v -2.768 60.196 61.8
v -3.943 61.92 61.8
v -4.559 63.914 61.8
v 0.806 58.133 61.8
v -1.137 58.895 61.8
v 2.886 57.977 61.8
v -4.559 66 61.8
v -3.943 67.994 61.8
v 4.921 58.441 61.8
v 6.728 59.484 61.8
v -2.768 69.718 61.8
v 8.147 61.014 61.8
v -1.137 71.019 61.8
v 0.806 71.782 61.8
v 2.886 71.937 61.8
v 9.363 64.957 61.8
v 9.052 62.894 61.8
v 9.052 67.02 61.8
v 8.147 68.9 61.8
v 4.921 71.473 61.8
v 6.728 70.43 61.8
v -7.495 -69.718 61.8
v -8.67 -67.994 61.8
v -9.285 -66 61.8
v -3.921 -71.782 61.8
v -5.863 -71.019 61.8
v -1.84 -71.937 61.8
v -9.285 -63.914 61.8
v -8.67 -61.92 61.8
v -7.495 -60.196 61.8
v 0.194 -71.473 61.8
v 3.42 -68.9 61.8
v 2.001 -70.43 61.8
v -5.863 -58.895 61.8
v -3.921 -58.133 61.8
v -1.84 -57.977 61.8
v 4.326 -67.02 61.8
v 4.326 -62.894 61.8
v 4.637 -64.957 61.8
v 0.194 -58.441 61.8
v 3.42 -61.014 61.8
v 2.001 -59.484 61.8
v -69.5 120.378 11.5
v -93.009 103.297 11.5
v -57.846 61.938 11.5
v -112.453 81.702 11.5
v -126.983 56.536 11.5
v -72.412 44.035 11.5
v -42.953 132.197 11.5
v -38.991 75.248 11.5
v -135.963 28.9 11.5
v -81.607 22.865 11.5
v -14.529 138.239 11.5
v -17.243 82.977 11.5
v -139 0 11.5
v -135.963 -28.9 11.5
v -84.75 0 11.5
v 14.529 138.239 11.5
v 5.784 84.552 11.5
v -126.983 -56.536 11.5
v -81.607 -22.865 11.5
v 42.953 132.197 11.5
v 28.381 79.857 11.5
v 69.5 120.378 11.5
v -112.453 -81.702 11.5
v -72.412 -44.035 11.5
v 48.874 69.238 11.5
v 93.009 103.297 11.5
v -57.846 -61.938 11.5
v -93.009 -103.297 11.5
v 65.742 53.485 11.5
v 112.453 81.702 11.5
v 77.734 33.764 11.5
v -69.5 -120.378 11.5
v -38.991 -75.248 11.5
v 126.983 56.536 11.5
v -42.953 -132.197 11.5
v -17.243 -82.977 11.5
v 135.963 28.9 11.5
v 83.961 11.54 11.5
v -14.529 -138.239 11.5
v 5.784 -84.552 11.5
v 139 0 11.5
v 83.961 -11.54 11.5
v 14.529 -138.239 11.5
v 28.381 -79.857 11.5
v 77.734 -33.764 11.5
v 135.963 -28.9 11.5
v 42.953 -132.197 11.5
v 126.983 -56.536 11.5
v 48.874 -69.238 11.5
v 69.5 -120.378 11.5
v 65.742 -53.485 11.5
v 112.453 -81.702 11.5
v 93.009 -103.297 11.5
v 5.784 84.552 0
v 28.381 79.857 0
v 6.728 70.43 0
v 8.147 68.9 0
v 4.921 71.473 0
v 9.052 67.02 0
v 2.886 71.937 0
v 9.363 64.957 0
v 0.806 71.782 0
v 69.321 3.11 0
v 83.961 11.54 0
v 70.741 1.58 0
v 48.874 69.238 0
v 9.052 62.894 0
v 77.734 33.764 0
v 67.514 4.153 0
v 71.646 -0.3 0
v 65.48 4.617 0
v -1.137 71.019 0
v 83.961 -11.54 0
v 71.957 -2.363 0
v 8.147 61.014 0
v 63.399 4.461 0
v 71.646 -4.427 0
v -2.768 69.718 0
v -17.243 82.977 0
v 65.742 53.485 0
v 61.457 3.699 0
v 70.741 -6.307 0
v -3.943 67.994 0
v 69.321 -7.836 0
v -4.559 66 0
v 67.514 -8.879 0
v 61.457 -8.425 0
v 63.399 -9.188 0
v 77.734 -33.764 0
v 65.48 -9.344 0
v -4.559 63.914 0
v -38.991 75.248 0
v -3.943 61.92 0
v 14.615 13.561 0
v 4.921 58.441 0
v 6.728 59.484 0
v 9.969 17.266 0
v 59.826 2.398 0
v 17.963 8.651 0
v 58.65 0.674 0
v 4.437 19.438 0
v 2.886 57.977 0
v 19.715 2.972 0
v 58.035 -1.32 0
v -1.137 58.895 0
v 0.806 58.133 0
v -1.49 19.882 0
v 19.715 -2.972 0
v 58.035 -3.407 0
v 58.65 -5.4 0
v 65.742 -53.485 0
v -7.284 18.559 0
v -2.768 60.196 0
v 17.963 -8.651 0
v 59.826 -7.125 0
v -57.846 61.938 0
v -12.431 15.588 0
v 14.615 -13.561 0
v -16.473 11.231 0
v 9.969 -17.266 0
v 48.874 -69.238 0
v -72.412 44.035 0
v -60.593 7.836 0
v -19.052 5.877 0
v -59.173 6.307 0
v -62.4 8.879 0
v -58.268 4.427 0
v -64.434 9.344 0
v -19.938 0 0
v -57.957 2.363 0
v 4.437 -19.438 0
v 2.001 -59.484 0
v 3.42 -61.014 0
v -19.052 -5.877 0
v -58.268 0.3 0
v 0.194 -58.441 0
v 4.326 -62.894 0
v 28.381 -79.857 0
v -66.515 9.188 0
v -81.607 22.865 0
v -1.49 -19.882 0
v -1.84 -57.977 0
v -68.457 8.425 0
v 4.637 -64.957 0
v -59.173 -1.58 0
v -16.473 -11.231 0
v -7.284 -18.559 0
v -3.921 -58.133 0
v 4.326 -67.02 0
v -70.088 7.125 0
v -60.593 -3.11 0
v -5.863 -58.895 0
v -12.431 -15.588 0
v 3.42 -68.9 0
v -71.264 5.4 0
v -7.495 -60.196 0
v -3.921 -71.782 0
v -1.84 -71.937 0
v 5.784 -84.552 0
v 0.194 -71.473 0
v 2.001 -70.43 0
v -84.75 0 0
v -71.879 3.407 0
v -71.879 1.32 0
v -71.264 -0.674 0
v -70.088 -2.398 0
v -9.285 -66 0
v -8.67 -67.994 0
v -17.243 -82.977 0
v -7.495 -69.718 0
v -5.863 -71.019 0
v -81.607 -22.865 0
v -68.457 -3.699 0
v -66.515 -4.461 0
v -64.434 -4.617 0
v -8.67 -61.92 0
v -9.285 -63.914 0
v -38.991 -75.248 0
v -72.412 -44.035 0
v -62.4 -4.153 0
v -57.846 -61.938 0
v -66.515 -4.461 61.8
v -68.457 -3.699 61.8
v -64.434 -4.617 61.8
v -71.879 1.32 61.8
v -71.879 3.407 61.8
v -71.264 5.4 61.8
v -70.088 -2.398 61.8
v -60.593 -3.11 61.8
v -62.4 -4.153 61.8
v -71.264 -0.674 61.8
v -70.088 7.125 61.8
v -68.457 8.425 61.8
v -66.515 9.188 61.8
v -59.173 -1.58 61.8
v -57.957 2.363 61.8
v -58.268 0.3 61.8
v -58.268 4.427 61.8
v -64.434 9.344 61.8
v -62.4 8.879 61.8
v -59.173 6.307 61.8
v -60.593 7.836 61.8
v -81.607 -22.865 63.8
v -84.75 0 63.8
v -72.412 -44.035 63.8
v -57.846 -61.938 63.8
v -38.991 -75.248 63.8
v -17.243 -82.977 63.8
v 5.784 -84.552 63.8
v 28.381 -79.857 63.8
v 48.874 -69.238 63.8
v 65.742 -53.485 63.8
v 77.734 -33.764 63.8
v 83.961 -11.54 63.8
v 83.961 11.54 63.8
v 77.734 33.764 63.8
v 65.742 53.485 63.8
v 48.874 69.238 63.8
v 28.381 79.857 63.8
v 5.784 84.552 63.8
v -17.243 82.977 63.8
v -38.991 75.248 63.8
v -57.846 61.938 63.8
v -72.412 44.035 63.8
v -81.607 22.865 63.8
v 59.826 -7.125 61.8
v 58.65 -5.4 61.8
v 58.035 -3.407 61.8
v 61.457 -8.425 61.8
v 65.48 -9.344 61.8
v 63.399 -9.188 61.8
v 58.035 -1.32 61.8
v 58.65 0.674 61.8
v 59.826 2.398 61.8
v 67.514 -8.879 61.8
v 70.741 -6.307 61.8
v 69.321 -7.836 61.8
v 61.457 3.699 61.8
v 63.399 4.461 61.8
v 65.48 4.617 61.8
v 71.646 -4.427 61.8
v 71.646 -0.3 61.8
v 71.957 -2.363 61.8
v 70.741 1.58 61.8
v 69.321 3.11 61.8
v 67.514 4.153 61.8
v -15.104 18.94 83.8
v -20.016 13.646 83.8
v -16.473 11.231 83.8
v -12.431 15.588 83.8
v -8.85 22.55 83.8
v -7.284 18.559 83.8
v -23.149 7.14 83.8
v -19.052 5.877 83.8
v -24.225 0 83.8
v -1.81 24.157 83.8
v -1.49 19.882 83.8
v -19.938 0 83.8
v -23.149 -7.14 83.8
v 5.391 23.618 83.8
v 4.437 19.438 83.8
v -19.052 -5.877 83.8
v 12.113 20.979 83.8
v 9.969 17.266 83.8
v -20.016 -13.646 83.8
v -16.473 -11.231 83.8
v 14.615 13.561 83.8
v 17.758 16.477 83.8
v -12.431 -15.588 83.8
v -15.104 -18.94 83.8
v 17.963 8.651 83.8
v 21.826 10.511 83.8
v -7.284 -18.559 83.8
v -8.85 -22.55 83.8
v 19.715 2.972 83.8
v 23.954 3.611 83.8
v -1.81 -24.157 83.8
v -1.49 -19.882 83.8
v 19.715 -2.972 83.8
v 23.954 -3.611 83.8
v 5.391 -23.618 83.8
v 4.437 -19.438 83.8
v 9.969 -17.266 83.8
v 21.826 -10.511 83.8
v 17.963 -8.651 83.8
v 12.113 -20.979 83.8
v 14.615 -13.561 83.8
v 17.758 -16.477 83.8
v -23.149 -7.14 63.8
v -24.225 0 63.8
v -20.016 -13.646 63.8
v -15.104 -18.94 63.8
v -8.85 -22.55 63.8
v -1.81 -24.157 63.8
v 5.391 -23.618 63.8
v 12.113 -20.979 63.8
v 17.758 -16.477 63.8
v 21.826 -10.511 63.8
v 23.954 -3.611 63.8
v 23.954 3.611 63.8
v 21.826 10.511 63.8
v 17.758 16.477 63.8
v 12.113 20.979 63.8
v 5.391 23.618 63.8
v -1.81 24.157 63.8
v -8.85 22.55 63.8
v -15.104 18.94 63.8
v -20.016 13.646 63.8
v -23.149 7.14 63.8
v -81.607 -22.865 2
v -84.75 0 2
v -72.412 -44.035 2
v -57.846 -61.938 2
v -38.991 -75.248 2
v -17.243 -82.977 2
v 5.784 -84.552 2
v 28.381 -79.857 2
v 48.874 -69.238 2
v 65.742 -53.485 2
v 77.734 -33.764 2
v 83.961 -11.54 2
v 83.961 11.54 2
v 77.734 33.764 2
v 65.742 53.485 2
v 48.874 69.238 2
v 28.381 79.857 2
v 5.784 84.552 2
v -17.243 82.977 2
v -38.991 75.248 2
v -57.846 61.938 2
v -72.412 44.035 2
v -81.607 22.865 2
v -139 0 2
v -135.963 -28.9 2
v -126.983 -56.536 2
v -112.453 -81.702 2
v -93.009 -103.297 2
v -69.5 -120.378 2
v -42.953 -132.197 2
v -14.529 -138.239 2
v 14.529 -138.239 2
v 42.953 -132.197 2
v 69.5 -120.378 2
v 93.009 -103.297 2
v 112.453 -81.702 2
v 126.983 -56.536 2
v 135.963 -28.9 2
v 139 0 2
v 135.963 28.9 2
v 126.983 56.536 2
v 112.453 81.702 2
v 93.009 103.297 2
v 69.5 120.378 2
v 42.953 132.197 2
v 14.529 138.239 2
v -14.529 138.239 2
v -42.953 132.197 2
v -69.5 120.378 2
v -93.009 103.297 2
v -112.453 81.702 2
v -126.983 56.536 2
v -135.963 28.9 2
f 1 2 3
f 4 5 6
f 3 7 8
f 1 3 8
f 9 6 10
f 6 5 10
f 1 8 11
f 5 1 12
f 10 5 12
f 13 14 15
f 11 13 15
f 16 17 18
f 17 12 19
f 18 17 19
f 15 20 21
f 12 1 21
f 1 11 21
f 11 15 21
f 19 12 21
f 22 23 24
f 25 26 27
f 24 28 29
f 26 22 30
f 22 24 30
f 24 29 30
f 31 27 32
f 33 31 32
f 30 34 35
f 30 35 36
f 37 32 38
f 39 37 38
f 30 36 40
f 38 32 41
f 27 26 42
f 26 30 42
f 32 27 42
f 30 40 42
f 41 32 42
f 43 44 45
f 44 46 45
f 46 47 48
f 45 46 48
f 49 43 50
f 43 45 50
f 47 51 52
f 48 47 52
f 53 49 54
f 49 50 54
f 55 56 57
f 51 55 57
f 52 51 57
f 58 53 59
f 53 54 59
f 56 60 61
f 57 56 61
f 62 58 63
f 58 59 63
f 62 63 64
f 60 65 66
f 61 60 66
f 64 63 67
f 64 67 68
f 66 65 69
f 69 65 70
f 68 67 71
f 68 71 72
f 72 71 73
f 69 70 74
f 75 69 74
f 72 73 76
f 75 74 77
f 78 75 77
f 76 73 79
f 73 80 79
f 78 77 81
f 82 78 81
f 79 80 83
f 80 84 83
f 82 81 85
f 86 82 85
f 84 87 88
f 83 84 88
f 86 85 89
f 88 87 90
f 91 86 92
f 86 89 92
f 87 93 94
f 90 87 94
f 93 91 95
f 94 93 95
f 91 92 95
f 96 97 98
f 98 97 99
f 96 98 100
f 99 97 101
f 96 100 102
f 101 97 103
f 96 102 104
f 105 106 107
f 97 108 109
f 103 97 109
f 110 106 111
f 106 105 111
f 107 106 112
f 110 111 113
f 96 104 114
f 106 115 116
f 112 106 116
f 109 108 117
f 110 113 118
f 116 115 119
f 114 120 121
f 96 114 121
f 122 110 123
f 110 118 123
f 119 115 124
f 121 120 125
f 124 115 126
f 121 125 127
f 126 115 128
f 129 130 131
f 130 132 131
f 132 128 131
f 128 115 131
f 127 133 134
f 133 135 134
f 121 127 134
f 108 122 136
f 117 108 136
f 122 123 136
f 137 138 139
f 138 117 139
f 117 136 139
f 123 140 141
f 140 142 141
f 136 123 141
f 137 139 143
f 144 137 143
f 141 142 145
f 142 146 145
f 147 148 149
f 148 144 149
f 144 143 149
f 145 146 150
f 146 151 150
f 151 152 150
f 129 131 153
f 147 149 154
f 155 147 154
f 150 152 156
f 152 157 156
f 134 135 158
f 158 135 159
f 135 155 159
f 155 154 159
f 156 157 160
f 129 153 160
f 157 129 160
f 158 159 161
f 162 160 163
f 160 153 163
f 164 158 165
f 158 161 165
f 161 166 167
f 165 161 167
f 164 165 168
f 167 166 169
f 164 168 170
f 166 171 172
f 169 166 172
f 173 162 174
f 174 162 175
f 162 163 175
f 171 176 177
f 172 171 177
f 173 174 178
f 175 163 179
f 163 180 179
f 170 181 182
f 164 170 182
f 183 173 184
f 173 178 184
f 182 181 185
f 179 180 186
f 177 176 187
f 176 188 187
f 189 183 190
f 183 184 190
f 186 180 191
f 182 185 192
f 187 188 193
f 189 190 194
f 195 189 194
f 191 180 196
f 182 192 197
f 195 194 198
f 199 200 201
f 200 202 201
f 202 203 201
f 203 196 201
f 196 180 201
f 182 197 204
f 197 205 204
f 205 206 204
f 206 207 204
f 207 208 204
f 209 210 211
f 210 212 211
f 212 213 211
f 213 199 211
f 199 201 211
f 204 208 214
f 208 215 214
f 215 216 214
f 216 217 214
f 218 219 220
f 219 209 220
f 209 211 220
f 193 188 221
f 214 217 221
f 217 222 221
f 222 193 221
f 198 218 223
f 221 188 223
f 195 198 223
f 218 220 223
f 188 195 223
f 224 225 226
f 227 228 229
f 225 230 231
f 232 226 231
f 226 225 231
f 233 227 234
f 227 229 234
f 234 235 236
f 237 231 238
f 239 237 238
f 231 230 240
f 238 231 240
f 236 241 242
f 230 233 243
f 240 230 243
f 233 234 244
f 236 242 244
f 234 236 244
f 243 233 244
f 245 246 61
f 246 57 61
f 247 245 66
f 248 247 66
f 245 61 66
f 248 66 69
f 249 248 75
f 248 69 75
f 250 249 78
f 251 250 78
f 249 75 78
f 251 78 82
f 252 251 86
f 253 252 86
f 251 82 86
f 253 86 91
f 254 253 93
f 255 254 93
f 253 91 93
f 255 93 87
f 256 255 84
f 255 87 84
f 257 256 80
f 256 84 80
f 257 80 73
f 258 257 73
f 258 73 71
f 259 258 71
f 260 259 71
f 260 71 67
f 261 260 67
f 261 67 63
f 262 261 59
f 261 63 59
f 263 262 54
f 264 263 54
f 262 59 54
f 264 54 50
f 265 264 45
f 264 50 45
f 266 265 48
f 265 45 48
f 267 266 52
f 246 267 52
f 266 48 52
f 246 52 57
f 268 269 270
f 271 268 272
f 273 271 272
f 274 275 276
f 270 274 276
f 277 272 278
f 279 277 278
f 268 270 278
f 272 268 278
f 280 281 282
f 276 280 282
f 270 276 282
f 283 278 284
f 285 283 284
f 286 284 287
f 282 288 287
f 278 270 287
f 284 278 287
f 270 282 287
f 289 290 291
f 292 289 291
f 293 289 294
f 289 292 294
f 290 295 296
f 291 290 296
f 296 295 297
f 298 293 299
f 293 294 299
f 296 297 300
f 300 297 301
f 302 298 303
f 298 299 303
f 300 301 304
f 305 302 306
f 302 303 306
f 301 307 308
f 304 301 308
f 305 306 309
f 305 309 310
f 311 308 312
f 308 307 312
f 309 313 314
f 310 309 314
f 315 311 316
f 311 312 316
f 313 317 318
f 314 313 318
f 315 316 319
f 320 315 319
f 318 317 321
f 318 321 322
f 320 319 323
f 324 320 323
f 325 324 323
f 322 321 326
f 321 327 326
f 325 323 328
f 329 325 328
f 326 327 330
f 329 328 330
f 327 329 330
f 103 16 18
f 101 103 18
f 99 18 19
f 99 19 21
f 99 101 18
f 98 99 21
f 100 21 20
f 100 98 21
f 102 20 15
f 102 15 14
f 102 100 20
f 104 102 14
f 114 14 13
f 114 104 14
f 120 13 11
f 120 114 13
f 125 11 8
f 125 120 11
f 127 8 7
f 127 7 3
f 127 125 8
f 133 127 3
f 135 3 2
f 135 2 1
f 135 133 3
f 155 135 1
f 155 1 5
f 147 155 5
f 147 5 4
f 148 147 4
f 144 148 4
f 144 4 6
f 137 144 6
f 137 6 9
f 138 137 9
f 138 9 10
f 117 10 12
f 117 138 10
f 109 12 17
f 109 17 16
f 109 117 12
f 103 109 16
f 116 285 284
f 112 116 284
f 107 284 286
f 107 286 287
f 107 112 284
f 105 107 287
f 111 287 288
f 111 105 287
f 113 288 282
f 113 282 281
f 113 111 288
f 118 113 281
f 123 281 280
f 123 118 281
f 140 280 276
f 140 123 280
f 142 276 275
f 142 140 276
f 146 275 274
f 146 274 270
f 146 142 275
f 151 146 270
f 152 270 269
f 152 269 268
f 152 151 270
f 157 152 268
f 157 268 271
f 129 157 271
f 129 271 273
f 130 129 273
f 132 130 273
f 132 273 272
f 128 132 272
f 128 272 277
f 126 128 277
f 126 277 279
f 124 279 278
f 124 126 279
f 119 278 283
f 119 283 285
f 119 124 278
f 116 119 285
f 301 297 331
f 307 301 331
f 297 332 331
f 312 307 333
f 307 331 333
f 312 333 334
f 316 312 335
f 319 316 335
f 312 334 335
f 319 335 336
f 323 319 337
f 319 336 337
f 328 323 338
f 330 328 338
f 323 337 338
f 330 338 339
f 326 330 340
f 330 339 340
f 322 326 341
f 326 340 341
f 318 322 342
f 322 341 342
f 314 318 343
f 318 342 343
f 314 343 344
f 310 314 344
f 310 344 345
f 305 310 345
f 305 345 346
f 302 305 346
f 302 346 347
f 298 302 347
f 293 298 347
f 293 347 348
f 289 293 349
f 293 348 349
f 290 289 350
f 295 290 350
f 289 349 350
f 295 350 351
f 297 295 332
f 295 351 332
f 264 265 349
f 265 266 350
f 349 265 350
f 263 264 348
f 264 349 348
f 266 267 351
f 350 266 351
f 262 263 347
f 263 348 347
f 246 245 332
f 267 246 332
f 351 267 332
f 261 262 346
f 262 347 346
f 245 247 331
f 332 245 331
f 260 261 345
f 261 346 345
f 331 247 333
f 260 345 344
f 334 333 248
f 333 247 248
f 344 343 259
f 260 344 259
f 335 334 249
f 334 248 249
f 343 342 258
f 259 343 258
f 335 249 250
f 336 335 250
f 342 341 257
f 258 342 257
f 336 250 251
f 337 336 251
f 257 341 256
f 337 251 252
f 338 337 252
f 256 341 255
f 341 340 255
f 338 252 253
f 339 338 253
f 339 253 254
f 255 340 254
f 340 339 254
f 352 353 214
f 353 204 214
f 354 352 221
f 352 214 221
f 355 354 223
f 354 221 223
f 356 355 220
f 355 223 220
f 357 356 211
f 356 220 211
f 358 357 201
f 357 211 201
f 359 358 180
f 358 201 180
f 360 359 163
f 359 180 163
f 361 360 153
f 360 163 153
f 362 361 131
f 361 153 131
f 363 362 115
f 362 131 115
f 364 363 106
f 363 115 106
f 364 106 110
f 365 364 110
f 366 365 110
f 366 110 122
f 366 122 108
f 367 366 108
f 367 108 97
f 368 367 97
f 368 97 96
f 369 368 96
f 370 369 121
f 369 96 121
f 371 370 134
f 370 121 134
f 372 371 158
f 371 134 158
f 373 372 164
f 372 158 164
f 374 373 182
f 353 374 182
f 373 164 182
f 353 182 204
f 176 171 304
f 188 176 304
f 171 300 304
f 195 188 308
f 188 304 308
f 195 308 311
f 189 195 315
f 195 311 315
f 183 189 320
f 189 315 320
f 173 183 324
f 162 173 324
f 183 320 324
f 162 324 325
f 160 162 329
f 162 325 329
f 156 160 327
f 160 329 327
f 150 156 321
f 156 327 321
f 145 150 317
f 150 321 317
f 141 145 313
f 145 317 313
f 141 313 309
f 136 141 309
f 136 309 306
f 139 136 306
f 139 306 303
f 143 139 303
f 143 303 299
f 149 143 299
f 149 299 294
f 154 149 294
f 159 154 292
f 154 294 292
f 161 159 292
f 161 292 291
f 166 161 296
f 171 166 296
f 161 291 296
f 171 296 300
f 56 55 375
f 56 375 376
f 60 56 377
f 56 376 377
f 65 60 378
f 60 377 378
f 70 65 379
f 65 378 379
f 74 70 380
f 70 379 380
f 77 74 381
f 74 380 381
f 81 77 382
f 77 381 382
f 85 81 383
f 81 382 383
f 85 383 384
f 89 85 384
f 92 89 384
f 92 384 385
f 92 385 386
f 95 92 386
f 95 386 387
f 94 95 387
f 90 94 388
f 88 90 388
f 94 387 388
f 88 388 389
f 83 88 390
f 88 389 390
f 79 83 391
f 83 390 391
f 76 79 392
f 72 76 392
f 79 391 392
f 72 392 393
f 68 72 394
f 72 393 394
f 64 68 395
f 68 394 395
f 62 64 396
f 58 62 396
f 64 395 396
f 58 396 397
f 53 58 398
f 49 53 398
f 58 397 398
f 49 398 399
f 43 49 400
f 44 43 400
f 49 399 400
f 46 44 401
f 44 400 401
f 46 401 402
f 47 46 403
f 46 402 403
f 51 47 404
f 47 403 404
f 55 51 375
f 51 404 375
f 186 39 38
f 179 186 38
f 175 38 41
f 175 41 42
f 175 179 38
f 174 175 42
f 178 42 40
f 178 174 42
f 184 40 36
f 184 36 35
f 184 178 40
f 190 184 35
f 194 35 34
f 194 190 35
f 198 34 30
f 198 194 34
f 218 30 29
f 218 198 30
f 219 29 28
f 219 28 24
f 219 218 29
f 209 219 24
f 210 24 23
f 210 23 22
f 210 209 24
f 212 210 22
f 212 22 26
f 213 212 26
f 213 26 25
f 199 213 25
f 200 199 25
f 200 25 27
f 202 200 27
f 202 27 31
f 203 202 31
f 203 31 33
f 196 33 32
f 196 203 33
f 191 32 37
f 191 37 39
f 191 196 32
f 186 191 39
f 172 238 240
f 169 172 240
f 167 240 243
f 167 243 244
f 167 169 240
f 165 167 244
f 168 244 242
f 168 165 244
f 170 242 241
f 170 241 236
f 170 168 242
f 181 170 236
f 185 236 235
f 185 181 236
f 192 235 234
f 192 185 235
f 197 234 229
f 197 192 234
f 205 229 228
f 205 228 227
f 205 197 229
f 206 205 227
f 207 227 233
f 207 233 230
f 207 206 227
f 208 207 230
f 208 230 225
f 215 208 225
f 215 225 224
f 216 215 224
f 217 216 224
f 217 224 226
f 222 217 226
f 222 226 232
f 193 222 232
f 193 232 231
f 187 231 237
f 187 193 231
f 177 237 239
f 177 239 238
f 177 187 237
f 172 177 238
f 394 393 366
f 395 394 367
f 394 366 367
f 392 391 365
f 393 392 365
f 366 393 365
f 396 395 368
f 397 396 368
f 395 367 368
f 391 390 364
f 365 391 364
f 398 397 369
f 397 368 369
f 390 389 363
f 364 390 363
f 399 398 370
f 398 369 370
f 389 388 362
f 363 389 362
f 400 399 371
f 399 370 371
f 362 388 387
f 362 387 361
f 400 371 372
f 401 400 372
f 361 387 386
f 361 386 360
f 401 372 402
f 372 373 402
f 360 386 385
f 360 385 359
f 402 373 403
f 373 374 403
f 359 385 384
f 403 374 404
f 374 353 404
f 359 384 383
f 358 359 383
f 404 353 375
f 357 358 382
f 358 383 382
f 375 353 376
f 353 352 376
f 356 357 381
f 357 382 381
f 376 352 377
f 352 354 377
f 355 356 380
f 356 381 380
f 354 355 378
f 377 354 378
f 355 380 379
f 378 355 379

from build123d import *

# Parameters (mm, degrees)
F2_R     = 7
F3_DEPTH = 61.8


with BuildPart() as f1:
    # F0 (on Front) → F1 (revolve)
    with BuildSketch(Plane.XZ):
        Polygon((-84.75, 0), (-19.9375, 0), (-19.9375, 83.8), (-24.225, 83.8), (-24.225, 63.8), (-84.75, 63.8), (-84.75, 11.5), (-139, 11.5), (-139, 2), (-84.75, 2), align=None)
    revolve(axis=Axis((0, 0, 41.9), (0, 0, 1)))

    # F2 (on Top) → F3 (cut)
    with BuildSketch(Plane.XY):
        with Locations((64.957023, -2.363298)):
            Circle(F2_R)
        with Locations((2.363298, 64.957023)):
            Circle(F2_R)
        with Locations((-64.957023, 2.363298)):
            Circle(F2_R)
        with Locations((-2.363298, -64.957023)):
            Circle(F2_R)
    extrude(amount=F3_DEPTH, mode=Mode.SUBTRACT)


solid = f1.part
